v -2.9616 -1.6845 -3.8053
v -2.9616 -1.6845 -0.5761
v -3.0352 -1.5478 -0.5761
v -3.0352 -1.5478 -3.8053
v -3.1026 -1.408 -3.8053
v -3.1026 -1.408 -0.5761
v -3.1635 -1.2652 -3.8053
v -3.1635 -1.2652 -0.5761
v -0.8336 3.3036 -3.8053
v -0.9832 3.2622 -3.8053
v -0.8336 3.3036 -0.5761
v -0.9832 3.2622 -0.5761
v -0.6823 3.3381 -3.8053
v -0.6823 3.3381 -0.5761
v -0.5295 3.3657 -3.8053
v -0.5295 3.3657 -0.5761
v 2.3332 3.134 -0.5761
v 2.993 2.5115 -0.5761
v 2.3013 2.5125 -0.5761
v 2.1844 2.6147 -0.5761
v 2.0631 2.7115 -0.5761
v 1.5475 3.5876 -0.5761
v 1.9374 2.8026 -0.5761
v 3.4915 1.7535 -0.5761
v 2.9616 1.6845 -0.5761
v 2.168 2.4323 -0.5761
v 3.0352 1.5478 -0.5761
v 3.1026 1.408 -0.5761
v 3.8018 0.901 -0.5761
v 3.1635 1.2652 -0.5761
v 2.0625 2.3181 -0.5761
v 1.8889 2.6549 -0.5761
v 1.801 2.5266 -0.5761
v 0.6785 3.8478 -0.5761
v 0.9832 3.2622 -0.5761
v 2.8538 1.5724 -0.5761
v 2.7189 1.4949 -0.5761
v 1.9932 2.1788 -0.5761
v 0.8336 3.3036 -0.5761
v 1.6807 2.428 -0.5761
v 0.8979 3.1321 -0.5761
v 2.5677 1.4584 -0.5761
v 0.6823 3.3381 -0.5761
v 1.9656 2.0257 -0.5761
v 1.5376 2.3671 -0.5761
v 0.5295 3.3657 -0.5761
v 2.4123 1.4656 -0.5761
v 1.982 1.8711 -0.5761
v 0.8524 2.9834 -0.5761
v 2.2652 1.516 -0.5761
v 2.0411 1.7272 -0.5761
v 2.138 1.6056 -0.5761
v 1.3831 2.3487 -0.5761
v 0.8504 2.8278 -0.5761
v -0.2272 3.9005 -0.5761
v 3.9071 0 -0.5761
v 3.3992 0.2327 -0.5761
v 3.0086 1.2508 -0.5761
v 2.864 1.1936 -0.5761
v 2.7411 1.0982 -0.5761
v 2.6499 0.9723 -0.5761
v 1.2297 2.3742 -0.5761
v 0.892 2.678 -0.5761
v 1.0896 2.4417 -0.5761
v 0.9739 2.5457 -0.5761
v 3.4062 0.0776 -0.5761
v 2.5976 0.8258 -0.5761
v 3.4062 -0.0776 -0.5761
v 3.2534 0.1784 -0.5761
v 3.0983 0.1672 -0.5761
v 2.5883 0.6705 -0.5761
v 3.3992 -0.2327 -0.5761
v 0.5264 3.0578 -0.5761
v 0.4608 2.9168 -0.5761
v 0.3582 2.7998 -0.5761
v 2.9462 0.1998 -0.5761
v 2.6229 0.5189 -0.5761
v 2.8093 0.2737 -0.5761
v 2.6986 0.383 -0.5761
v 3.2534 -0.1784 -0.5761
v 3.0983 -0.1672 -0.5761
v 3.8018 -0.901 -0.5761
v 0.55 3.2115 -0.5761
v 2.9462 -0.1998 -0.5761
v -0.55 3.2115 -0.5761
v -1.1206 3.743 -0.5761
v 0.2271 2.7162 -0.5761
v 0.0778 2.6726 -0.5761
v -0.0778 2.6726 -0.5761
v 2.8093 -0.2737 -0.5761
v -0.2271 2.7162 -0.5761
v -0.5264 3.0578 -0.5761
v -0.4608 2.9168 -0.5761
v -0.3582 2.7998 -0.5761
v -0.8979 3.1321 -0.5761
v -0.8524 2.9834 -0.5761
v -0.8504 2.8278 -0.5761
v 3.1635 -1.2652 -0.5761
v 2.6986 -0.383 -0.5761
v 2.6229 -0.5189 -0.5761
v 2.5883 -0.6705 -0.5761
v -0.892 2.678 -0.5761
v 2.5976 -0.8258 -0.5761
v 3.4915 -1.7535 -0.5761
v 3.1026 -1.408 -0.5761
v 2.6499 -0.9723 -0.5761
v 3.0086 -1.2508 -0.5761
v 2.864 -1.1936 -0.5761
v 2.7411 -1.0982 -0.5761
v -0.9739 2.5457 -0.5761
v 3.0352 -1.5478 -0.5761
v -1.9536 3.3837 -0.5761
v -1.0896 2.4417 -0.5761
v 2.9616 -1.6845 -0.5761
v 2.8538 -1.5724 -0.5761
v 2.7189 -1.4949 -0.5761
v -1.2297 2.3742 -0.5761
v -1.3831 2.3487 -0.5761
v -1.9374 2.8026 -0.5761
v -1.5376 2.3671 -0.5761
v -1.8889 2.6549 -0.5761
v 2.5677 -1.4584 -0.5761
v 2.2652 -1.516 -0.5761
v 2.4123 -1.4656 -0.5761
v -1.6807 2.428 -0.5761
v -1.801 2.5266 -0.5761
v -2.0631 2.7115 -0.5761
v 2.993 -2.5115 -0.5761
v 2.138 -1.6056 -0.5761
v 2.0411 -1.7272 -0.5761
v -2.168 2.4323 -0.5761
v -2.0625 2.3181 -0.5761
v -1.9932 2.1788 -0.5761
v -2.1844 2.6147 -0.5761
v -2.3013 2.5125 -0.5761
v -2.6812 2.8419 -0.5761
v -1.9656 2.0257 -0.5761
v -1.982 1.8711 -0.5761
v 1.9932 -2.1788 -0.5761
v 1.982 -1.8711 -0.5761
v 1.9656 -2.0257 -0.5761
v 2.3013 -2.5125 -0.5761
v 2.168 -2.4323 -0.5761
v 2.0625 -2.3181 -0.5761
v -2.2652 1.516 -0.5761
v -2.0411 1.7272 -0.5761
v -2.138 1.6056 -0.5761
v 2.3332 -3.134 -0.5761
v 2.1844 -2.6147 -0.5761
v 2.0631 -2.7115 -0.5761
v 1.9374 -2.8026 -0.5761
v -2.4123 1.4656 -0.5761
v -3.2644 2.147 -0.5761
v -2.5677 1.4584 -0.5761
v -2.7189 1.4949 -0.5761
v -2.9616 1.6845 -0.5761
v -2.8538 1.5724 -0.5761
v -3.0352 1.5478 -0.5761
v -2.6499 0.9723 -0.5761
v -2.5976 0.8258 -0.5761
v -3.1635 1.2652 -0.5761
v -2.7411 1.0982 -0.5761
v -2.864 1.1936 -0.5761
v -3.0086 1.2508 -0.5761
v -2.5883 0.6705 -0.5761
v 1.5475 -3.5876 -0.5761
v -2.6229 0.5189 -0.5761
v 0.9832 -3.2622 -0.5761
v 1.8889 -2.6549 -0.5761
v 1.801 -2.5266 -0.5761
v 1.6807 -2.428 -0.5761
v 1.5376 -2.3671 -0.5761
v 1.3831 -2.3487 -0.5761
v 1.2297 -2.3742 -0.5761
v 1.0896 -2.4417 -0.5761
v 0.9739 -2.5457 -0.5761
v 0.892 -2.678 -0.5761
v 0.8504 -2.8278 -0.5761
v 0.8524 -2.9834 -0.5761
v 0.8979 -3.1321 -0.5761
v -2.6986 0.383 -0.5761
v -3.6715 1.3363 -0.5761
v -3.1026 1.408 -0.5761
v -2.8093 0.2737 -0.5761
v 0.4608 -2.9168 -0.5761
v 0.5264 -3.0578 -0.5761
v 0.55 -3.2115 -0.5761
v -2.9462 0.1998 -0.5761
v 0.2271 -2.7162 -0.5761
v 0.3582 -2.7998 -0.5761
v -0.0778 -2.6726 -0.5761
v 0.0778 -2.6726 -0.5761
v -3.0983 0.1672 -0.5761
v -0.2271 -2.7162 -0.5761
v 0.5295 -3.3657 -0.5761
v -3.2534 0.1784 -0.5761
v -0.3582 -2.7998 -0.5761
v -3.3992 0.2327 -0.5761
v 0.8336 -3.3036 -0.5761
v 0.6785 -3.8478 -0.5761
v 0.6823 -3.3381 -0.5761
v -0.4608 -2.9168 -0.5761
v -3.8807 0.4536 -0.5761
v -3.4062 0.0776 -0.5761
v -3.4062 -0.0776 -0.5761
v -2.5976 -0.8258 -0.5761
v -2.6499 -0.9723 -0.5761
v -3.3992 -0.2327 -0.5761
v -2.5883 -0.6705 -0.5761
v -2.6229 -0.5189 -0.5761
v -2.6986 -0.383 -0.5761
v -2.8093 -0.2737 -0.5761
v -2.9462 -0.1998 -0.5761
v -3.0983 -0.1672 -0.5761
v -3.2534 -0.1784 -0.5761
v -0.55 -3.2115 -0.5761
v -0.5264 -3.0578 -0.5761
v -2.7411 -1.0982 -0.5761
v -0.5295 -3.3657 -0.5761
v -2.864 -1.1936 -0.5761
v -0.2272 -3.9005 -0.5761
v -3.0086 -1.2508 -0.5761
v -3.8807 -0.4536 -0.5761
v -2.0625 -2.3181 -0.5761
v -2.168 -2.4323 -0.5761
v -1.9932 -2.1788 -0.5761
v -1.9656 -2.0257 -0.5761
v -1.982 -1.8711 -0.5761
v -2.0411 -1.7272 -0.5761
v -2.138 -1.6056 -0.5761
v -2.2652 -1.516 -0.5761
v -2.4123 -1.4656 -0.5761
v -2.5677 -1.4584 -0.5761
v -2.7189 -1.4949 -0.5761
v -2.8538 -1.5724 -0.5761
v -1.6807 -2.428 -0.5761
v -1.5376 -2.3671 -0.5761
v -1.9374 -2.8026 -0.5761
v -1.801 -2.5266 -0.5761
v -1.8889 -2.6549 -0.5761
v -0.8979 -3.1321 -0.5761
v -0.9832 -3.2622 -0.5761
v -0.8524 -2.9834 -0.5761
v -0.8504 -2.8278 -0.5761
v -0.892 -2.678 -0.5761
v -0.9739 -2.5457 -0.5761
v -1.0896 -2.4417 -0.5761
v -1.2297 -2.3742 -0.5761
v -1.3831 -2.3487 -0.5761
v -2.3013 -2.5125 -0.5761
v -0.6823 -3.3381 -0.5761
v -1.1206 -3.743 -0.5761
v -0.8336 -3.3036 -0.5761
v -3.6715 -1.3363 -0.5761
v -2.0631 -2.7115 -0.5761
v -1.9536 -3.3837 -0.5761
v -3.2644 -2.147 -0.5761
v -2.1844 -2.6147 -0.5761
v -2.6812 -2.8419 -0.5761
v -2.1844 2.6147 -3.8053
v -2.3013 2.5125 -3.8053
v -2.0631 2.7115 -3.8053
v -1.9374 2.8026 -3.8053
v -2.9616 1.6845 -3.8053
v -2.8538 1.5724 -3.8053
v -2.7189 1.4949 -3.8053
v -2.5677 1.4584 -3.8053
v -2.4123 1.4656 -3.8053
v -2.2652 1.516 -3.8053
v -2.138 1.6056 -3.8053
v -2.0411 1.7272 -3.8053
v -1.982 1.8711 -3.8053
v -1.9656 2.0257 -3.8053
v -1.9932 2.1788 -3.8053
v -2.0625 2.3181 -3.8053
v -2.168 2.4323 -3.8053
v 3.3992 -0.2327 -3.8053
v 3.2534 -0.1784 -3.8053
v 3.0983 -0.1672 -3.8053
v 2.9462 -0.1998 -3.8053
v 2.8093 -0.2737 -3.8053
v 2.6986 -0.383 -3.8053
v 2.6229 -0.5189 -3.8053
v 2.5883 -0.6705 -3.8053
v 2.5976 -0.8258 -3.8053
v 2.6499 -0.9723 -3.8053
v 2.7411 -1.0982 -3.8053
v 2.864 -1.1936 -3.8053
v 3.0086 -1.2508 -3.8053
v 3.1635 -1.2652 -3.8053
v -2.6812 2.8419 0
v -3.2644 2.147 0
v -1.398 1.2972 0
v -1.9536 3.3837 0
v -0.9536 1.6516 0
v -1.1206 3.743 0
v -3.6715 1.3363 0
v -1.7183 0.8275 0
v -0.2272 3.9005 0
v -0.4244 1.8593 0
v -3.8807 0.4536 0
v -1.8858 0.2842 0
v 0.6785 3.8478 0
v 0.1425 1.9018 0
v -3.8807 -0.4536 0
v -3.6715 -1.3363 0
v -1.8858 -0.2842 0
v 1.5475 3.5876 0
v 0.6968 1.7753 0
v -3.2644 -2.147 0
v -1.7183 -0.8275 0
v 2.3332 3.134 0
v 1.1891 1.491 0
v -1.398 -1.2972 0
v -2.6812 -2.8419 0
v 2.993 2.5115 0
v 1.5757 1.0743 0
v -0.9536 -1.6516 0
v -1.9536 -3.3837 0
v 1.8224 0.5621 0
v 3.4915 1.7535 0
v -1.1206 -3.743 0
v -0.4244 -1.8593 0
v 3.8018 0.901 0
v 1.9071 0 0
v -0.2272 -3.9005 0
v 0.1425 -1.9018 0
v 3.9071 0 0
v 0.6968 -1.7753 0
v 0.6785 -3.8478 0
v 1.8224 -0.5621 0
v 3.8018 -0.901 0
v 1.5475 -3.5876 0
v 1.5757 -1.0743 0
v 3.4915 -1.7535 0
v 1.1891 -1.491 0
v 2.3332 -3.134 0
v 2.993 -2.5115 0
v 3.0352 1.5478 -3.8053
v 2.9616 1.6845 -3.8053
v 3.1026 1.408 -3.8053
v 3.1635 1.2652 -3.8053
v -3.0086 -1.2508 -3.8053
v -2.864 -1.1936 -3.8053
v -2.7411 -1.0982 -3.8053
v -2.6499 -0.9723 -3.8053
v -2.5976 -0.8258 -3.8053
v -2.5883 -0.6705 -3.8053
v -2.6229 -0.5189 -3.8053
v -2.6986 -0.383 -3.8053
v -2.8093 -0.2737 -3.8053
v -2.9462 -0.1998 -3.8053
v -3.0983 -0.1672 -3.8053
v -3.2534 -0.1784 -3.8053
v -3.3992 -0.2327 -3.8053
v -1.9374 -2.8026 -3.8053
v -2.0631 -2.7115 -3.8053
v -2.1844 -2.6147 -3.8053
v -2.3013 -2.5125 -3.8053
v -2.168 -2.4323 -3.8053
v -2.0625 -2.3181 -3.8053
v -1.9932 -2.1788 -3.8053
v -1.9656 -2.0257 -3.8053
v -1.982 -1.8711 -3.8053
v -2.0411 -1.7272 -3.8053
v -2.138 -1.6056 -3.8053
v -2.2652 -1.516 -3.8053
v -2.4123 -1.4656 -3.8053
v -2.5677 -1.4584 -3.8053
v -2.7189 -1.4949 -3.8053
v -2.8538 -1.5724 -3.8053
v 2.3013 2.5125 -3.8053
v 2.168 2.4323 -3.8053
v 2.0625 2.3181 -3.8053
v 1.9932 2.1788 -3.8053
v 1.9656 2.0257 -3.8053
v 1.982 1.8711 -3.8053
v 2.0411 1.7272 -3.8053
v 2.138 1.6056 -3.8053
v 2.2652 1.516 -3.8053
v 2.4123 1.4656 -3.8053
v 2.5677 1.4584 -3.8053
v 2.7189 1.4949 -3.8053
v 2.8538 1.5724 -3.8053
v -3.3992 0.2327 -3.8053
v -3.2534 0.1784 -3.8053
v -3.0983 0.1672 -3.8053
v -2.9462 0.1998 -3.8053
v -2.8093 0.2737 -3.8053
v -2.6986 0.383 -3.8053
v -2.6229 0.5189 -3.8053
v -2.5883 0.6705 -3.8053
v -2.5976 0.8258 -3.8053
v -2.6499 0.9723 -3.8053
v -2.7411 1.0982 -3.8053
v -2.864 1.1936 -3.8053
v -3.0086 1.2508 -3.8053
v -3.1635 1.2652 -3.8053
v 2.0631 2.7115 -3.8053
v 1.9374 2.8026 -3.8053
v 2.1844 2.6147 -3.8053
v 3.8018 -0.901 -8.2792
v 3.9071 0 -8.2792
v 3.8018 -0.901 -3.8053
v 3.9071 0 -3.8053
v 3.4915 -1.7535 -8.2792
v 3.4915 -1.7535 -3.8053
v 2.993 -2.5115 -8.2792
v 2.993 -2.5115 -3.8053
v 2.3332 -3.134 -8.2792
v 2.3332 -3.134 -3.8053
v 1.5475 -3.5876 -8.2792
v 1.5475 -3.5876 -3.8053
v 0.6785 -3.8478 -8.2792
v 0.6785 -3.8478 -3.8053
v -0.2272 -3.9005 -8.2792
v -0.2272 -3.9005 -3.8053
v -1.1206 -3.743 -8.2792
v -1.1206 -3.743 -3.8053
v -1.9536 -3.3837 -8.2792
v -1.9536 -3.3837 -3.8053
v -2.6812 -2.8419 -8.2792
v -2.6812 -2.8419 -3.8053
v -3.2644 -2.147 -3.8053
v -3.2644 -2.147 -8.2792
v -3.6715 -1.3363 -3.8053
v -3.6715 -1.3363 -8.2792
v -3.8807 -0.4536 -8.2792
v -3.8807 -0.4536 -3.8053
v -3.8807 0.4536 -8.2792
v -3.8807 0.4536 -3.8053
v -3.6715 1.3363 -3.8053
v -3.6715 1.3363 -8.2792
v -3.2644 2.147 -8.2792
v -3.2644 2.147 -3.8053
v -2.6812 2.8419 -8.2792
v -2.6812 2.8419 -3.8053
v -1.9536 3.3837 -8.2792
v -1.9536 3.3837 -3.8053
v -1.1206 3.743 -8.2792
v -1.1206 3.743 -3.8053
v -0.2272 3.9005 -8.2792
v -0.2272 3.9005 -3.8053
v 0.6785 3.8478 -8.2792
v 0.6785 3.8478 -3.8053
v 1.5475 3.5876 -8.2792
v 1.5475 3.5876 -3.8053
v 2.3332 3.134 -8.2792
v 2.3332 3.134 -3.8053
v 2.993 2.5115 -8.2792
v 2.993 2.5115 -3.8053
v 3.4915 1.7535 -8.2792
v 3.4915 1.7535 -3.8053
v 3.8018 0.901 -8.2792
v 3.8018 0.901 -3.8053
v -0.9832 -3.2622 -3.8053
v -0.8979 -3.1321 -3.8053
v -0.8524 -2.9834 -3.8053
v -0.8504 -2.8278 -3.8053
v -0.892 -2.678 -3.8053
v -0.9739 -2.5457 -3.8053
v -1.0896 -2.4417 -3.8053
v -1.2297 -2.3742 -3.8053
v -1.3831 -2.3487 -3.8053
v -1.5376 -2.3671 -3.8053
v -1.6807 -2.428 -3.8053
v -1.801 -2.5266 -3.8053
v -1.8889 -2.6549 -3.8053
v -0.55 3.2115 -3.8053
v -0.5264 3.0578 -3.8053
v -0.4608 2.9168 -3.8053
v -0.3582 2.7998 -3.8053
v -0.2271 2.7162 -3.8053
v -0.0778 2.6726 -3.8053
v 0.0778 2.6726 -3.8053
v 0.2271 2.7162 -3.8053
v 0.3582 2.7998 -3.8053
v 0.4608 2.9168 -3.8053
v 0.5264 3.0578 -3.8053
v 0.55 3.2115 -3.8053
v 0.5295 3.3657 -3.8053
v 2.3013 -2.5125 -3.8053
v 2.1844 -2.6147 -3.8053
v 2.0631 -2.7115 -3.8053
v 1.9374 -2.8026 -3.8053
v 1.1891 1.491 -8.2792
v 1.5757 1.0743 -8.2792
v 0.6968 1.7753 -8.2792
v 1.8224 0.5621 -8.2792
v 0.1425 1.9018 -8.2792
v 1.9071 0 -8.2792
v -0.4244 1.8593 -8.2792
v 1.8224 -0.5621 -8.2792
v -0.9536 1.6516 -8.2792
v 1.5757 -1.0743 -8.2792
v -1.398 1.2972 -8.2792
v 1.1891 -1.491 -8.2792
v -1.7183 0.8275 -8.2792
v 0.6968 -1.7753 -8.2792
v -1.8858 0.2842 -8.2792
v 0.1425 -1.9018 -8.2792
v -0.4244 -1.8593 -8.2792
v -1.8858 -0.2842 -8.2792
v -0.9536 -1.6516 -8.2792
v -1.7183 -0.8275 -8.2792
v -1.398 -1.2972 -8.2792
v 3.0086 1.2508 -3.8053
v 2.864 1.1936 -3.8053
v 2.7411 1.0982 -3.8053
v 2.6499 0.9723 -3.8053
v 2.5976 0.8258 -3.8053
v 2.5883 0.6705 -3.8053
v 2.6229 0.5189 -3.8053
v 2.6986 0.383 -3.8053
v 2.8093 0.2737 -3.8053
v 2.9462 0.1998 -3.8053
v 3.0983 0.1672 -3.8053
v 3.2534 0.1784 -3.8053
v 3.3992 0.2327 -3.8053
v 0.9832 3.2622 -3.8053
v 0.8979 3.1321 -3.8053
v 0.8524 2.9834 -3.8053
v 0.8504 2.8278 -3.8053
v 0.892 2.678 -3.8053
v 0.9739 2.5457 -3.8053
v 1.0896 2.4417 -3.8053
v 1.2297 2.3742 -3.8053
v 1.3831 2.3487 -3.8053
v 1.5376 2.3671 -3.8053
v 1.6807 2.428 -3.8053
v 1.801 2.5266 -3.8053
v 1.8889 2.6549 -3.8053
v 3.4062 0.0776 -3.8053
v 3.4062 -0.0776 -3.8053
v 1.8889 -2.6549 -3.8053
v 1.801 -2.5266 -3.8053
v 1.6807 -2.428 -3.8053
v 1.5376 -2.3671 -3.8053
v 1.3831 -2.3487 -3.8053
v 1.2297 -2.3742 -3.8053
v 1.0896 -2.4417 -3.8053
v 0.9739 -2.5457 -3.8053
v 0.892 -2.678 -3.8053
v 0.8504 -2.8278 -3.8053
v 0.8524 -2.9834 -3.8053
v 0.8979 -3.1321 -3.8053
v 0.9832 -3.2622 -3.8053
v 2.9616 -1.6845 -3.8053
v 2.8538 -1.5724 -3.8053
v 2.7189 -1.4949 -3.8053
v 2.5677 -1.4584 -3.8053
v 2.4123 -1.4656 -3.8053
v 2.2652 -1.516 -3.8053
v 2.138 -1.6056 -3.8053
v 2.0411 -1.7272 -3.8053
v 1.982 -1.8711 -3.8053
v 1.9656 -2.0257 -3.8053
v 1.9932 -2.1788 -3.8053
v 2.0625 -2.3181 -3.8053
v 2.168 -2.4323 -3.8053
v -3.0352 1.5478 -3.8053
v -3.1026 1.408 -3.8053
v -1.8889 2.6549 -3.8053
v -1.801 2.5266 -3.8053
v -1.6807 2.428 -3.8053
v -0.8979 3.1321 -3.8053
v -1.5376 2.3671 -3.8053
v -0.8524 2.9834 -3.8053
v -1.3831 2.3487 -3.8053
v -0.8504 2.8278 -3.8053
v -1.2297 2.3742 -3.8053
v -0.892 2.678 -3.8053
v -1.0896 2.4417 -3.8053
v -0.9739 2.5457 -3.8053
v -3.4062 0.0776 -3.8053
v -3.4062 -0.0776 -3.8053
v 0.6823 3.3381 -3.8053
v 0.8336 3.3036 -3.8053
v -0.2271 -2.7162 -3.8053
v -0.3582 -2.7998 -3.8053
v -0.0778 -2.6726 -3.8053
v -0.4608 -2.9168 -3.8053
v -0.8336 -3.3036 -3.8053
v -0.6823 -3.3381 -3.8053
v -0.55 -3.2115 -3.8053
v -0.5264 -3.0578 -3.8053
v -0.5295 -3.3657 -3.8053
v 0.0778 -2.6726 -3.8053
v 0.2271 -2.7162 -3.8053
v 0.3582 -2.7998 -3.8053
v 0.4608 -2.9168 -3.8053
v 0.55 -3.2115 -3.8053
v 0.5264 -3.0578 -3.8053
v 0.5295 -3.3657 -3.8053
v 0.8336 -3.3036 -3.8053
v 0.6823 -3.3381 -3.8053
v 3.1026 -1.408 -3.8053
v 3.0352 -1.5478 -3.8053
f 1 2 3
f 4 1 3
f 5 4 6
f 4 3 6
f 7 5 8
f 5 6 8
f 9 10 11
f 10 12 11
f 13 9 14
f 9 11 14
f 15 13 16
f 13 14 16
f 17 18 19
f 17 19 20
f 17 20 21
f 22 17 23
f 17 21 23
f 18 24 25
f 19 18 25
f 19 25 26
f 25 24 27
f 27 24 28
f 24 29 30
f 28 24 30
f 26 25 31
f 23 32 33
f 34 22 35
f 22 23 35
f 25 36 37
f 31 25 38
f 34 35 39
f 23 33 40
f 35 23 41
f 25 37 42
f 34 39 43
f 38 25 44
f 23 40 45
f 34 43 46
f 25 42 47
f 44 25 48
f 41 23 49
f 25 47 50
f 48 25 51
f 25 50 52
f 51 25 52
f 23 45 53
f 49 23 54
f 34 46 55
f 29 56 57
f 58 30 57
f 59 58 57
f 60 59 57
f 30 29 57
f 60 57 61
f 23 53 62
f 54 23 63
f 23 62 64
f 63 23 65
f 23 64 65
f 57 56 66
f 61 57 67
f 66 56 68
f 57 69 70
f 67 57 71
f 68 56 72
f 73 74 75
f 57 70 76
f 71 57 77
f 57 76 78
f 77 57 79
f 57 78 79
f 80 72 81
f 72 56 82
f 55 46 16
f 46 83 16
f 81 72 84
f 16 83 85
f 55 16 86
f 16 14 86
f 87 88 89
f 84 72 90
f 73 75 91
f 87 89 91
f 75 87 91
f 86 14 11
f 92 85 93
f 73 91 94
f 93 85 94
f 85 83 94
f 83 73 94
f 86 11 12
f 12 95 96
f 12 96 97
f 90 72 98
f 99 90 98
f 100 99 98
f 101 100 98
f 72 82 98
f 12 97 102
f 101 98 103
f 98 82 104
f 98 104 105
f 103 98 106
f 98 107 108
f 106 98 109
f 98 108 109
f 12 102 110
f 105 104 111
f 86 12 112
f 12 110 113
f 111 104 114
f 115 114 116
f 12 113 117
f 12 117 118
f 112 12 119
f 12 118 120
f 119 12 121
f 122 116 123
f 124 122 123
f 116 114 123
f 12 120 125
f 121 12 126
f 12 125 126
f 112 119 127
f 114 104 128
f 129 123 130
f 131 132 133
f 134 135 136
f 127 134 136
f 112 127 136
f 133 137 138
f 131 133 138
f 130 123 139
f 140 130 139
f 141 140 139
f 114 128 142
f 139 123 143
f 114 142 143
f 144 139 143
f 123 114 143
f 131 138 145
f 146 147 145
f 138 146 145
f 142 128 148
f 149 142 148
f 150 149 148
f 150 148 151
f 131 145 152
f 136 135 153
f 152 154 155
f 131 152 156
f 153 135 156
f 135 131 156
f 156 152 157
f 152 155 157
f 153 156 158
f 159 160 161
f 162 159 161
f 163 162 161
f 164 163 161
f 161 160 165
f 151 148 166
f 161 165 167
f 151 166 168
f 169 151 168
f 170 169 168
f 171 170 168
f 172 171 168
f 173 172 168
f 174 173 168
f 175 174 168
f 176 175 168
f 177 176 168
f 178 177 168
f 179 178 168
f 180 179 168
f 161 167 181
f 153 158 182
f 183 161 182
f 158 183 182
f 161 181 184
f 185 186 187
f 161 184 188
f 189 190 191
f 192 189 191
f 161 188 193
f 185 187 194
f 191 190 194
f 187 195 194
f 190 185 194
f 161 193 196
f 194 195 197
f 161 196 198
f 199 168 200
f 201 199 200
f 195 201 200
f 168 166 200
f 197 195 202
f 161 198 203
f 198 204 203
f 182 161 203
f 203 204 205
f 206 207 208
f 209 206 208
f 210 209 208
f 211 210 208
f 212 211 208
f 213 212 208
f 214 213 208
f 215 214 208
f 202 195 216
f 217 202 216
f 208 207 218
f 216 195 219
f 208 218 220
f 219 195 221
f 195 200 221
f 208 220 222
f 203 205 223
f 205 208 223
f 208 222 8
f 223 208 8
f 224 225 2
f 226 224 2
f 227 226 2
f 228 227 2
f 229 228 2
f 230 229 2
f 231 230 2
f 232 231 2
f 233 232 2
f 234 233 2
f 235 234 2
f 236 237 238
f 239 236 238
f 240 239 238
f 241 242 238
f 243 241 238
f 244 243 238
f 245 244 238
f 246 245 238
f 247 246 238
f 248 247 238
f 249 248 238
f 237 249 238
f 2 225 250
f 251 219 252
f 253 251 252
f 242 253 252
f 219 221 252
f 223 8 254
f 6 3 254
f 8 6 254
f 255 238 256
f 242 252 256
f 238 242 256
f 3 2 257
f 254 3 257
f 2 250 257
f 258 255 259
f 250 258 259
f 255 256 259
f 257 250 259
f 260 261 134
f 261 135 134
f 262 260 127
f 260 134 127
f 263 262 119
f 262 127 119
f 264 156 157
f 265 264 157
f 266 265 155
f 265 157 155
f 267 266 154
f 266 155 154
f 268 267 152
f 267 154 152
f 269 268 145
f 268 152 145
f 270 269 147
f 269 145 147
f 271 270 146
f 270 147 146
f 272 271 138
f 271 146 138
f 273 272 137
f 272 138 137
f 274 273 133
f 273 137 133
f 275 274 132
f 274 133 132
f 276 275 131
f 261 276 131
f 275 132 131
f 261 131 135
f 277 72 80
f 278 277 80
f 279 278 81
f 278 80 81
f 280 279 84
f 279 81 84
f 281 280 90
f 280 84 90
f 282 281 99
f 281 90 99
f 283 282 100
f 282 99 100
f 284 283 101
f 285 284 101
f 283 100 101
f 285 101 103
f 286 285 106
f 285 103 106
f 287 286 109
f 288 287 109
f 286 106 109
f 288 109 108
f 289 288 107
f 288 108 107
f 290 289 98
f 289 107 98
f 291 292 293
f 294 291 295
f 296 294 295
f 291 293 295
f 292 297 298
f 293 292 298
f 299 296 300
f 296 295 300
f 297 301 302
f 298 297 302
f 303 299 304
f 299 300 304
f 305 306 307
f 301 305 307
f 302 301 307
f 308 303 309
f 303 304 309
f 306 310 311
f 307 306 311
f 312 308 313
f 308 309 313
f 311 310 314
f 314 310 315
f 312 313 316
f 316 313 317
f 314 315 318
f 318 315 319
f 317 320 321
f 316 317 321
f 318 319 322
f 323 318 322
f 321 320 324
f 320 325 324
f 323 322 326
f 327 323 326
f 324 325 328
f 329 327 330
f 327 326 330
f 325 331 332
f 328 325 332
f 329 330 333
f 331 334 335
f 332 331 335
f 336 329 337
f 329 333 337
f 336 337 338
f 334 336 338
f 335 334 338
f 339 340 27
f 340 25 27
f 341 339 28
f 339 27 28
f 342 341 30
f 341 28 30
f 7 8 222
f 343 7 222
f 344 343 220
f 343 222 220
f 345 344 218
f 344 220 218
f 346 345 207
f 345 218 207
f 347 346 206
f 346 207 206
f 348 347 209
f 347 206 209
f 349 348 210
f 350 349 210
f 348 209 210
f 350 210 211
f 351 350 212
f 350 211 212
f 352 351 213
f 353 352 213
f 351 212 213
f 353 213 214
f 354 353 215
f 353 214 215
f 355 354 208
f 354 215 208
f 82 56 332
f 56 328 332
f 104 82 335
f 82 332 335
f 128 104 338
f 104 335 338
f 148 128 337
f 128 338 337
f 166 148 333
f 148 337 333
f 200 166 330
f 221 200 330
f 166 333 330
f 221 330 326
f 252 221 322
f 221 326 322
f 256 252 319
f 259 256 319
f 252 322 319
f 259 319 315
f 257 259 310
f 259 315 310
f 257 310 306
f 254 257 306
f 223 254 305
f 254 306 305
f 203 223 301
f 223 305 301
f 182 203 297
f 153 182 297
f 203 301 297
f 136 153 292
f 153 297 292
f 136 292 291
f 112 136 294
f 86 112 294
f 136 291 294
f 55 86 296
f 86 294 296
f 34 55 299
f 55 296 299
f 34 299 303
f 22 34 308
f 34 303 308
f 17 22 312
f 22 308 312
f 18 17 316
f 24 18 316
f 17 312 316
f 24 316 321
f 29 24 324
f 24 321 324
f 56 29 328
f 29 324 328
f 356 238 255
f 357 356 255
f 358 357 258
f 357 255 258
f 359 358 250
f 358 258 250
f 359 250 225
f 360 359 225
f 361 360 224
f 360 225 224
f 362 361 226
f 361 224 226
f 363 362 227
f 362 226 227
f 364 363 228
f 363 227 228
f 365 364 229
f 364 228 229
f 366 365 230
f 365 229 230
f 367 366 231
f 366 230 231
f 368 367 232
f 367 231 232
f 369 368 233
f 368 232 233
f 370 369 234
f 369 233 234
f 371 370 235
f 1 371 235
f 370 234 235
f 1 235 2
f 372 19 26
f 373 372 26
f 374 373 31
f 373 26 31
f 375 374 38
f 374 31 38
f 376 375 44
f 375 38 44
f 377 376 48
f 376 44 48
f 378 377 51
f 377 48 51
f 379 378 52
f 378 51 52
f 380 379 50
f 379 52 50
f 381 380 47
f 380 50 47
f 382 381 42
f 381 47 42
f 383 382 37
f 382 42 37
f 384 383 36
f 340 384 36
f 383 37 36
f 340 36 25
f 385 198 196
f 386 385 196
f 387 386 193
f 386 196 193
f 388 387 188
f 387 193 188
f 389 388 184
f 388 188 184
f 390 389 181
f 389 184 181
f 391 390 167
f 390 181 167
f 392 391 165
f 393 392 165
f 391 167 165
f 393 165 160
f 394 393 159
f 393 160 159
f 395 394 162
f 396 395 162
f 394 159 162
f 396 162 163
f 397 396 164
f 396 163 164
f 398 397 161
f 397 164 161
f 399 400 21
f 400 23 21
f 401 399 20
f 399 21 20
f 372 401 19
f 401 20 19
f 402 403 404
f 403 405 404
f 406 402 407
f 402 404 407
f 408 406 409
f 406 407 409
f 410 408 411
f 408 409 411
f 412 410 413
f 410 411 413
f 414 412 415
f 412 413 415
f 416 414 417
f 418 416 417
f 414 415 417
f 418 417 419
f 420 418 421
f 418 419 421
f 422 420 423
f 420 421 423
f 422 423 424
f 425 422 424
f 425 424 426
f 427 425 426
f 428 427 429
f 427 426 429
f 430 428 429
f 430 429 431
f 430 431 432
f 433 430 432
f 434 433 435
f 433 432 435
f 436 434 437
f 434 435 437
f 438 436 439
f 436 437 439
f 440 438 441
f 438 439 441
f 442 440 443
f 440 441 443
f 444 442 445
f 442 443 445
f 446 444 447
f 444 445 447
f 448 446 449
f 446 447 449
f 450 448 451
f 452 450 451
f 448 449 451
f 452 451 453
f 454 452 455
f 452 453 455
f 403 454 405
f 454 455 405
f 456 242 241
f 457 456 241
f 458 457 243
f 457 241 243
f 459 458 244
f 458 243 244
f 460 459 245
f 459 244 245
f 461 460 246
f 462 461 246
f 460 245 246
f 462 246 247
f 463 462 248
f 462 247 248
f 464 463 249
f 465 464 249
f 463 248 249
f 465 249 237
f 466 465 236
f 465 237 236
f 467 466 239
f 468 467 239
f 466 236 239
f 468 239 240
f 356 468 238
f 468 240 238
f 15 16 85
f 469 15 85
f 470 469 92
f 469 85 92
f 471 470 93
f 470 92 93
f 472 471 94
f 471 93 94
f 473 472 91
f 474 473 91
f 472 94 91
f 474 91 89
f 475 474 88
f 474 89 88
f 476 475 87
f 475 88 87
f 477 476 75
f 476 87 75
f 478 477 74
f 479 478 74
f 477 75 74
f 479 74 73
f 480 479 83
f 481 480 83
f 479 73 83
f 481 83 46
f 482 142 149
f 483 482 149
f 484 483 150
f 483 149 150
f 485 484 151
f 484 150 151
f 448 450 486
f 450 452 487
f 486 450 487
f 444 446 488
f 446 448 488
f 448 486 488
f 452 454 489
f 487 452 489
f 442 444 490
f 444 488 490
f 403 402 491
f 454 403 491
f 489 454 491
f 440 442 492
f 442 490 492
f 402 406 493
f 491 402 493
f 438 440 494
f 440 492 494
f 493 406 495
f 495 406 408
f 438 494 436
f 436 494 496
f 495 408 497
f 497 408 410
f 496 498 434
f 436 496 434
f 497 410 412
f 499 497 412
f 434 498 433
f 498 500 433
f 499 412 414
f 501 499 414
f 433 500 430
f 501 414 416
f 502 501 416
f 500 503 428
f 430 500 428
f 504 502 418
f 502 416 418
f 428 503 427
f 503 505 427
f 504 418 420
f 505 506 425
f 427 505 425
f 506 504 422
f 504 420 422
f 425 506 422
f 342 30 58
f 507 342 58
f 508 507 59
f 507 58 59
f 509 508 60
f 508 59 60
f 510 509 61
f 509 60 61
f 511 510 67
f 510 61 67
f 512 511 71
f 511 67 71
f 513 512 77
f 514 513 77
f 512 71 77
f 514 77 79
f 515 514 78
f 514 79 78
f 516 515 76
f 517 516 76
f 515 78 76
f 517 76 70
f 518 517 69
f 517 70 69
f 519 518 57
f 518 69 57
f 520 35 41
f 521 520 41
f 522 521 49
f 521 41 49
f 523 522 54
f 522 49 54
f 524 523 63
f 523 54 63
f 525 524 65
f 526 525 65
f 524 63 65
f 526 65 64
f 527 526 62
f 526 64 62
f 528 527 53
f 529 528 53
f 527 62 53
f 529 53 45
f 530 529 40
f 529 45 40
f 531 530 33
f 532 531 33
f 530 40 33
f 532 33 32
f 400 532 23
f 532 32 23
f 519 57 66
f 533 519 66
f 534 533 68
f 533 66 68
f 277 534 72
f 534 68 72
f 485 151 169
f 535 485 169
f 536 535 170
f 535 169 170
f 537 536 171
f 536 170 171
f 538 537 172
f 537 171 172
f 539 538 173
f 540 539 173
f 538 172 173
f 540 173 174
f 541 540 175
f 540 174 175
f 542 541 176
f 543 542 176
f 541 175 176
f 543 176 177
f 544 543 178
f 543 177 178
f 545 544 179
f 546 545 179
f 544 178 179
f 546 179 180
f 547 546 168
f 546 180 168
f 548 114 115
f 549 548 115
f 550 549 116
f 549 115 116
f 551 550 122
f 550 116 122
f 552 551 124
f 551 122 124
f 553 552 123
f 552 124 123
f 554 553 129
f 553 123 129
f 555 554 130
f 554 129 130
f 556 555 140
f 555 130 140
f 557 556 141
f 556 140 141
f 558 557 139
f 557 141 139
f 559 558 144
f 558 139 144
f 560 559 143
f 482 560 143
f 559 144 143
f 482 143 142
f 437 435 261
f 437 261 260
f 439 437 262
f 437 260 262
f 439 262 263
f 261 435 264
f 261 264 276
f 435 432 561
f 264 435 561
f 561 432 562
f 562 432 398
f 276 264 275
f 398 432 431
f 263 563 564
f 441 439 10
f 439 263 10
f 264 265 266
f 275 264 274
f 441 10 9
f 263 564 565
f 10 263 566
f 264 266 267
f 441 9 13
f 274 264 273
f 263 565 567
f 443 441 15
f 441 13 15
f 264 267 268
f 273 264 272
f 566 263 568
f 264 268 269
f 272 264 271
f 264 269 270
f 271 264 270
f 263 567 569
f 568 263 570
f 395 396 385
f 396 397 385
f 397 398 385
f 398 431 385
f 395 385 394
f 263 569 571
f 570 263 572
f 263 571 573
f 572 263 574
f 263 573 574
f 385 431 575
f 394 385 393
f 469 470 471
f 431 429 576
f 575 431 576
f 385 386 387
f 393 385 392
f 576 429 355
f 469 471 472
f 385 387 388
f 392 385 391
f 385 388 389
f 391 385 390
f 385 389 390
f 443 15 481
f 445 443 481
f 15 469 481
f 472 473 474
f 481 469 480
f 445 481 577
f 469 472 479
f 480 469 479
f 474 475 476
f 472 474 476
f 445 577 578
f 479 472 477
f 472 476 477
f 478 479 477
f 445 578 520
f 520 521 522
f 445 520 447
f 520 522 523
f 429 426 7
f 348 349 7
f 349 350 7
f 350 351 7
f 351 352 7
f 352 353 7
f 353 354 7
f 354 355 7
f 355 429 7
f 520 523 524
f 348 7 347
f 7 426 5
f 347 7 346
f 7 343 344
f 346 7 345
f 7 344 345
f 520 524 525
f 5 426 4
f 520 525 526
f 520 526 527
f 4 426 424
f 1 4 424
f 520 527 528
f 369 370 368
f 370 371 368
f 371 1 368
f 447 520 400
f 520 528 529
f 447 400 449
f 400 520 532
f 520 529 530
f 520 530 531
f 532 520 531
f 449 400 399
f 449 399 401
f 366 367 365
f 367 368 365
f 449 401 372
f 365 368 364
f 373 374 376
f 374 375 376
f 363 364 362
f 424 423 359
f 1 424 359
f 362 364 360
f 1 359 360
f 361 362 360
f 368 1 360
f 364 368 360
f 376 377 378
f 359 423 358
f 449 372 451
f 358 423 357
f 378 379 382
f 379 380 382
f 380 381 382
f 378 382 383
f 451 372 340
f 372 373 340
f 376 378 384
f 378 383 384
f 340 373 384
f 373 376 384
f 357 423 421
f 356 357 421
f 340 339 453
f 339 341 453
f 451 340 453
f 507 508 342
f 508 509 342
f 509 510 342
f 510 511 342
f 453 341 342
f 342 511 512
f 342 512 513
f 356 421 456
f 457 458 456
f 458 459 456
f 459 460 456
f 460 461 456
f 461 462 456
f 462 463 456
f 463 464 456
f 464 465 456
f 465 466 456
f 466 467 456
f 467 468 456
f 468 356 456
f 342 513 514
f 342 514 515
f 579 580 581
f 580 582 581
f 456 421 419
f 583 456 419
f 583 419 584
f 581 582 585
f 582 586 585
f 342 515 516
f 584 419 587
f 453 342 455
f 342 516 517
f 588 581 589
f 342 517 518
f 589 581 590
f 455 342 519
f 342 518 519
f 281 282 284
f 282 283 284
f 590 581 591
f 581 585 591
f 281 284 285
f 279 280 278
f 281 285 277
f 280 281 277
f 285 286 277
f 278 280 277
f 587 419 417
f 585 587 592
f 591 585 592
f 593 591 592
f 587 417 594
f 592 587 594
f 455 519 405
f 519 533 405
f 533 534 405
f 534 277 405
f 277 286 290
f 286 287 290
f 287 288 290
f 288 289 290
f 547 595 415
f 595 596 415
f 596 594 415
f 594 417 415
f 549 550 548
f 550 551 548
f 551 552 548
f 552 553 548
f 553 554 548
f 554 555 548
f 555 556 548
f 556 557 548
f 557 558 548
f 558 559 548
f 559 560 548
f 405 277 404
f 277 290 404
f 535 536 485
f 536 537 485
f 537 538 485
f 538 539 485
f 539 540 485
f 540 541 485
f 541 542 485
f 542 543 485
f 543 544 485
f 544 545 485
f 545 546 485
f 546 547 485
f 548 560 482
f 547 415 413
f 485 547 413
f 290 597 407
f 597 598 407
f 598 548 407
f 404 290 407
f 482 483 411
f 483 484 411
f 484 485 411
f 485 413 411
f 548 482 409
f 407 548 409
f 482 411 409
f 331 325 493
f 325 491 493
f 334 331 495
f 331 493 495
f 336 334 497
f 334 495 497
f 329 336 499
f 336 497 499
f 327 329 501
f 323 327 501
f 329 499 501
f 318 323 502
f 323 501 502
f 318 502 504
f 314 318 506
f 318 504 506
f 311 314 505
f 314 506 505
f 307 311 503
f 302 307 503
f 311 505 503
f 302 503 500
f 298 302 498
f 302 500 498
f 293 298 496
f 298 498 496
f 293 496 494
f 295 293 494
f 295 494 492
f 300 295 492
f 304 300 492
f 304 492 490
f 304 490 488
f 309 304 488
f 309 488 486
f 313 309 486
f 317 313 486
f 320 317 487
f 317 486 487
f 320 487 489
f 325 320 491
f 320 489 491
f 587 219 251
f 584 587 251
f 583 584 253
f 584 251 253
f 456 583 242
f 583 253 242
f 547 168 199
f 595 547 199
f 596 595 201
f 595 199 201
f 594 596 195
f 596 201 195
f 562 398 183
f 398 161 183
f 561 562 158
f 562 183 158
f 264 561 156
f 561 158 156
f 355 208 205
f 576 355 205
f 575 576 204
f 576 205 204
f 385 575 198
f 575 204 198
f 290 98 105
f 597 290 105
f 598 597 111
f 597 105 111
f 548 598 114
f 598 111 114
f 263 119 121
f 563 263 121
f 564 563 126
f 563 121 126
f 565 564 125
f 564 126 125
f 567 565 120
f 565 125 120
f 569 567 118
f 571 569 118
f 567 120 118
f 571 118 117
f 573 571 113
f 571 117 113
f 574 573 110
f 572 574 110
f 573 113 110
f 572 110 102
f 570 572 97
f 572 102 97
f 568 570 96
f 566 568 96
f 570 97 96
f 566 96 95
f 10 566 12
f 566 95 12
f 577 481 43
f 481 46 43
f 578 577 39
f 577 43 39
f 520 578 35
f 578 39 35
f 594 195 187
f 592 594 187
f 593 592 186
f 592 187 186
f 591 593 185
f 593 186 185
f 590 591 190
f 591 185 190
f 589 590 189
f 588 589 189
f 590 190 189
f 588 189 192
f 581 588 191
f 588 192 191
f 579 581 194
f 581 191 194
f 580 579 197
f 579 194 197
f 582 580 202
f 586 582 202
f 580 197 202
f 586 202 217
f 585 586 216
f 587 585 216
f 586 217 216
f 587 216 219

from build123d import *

# Parameters (mm, degrees)
CUT_EXTRUDE1_START = 3.229191933
CUT_EXTRUDE1_DEPTH = 3.229191933


with BuildPart() as part:
    # Sketch1 → Revolve2 (revolve)
    with BuildSketch(Plane(origin=(0, 0, 0), x_dir=(0, 0, -1), z_dir=(1, 0, 0)), mode=Mode.PRIVATE) as revolve2_sk:
        Polygon((4.77917475, 3.907122765), (3.805254495, 3.907122765), (3.805254495, 3.407122765), (0.576062562, 3.407122765), (0.576062562, 3.907122765), (0, 3.907122765), (0, 1.907122765), (4.77917475, 1.907122765), (8.27917475, 1.907122765), (8.27917475, 3.753666669), (8.27917475, 3.907122765), align=None)
    revolve(revolve2_sk.sketch.rotate(Axis((0, 0, 0), (0, 0, -1)), 90), axis=Axis((0, 0, 0), (0, 0, -1)))

    # Sketch3 → Cut-Extrude1 (cut)
    with BuildSketch(Plane.XY.offset(-3.805254495).offset(CUT_EXTRUDE1_START)):
        with BuildLine():
            ThreePointArc((-2.301258727, 2.512507474), (-2.663795842, 2.124306298), (-2.961591907, 1.684475857))
            ThreePointArc((-2.961591907, 1.684475857), (-2.085240545, 1.662923844), (-2.301258727, 2.512507474))
        make_face()
        with BuildLine():
            ThreePointArc((-0.529546095, 3.365719309), (0, 2.667122765), (0.529546095, 3.365719309))
            ThreePointArc((0.529546095, 3.365719309), (0, 3.407122765), (-0.529546095, 3.365719309))
        make_face()
        with BuildLine():
            ThreePointArc((0.983226333, 3.262169756), (1.157221198, 2.402994578), (1.937435425, 2.802646876))
            ThreePointArc((1.937435425, 2.802646876), (1.478295165, 3.06971154), (0.983226333, 3.262169756))
        make_face()
        with BuildLine():
            ThreePointArc((2.301258727, 2.512507474), (2.085240545, 1.662923844), (2.961591907, 1.684475857))
            ThreePointArc((2.961591907, 1.684475857), (2.663795842, 2.124306298), (2.301258727, 2.512507474))
        make_face()
        with BuildLine():
            ThreePointArc((3.163498608, 1.265212273), (2.600252429, 0.593490649), (3.399168791, 0.232673735))
            ThreePointArc((3.399168791, 0.232673735), (3.321699084, 0.75815614), (3.163498608, 1.265212273))
        make_face()
        with BuildLine():
            ThreePointArc((3.399168791, -0.232673735), (2.600252429, -0.593490649), (3.163498608, -1.265212273))
            ThreePointArc((3.163498608, -1.265212273), (3.321699084, -0.75815614), (3.399168791, -0.232673735))
        make_face()
        with BuildLine():
            ThreePointArc((2.961591907, -1.684475857), (2.085240545, -1.662923844), (2.301258727, -2.512507474))
            ThreePointArc((2.301258727, -2.512507474), (2.663795842, -2.124306298), (2.961591907, -1.684475857))
        make_face()
        with BuildLine():
            ThreePointArc((1.937435425, -2.802646876), (1.157221198, -2.402994578), (0.983226333, -3.262169756))
            ThreePointArc((0.983226333, -3.262169756), (1.478295165, -3.06971154), (1.937435425, -2.802646876))
        make_face()
        with BuildLine():
            ThreePointArc((0.529546095, -3.365719309), (0, -2.667122765), (-0.529546095, -3.365719309))
            ThreePointArc((-0.529546095, -3.365719309), (0, -3.407122765), (0.529546095, -3.365719309))
        make_face()
        with BuildLine():
            ThreePointArc((-0.983226333, -3.262169756), (-1.157221198, -2.402994578), (-1.937435425, -2.802646876))
            ThreePointArc((-1.937435425, -2.802646876), (-1.478295165, -3.06971154), (-0.983226333, -3.262169756))
        make_face()
        with BuildLine():
            ThreePointArc((-2.301258727, -2.512507474), (-2.085240545, -1.662923844), (-2.961591907, -1.684475857))
            ThreePointArc((-2.961591907, -1.684475857), (-2.663795842, -2.124306298), (-2.301258727, -2.512507474))
        make_face()
        with BuildLine():
            ThreePointArc((-3.163498608, -1.265212273), (-2.600252429, -0.593490649), (-3.399168791, -0.232673735))
            ThreePointArc((-3.399168791, -0.232673735), (-3.321699084, -0.75815614), (-3.163498608, -1.265212273))
        make_face()
        with BuildLine():
            ThreePointArc((-3.399168791, 0.232673735), (-2.600252429, 0.593490649), (-3.163498608, 1.265212273))
            ThreePointArc((-3.163498608, 1.265212273), (-3.321699084, 0.75815614), (-3.399168791, 0.232673735))
        make_face()
        with BuildLine():
            ThreePointArc((-1.937435425, 2.802646876), (-1.157221198, 2.402994578), (-0.983226333, 3.262169756))
            ThreePointArc((-0.983226333, 3.262169756), (-1.478295165, 3.06971154), (-1.937435425, 2.802646876))
        make_face()
    extrude(amount=-CUT_EXTRUDE1_DEPTH, mode=Mode.SUBTRACT)


solid = part.part
